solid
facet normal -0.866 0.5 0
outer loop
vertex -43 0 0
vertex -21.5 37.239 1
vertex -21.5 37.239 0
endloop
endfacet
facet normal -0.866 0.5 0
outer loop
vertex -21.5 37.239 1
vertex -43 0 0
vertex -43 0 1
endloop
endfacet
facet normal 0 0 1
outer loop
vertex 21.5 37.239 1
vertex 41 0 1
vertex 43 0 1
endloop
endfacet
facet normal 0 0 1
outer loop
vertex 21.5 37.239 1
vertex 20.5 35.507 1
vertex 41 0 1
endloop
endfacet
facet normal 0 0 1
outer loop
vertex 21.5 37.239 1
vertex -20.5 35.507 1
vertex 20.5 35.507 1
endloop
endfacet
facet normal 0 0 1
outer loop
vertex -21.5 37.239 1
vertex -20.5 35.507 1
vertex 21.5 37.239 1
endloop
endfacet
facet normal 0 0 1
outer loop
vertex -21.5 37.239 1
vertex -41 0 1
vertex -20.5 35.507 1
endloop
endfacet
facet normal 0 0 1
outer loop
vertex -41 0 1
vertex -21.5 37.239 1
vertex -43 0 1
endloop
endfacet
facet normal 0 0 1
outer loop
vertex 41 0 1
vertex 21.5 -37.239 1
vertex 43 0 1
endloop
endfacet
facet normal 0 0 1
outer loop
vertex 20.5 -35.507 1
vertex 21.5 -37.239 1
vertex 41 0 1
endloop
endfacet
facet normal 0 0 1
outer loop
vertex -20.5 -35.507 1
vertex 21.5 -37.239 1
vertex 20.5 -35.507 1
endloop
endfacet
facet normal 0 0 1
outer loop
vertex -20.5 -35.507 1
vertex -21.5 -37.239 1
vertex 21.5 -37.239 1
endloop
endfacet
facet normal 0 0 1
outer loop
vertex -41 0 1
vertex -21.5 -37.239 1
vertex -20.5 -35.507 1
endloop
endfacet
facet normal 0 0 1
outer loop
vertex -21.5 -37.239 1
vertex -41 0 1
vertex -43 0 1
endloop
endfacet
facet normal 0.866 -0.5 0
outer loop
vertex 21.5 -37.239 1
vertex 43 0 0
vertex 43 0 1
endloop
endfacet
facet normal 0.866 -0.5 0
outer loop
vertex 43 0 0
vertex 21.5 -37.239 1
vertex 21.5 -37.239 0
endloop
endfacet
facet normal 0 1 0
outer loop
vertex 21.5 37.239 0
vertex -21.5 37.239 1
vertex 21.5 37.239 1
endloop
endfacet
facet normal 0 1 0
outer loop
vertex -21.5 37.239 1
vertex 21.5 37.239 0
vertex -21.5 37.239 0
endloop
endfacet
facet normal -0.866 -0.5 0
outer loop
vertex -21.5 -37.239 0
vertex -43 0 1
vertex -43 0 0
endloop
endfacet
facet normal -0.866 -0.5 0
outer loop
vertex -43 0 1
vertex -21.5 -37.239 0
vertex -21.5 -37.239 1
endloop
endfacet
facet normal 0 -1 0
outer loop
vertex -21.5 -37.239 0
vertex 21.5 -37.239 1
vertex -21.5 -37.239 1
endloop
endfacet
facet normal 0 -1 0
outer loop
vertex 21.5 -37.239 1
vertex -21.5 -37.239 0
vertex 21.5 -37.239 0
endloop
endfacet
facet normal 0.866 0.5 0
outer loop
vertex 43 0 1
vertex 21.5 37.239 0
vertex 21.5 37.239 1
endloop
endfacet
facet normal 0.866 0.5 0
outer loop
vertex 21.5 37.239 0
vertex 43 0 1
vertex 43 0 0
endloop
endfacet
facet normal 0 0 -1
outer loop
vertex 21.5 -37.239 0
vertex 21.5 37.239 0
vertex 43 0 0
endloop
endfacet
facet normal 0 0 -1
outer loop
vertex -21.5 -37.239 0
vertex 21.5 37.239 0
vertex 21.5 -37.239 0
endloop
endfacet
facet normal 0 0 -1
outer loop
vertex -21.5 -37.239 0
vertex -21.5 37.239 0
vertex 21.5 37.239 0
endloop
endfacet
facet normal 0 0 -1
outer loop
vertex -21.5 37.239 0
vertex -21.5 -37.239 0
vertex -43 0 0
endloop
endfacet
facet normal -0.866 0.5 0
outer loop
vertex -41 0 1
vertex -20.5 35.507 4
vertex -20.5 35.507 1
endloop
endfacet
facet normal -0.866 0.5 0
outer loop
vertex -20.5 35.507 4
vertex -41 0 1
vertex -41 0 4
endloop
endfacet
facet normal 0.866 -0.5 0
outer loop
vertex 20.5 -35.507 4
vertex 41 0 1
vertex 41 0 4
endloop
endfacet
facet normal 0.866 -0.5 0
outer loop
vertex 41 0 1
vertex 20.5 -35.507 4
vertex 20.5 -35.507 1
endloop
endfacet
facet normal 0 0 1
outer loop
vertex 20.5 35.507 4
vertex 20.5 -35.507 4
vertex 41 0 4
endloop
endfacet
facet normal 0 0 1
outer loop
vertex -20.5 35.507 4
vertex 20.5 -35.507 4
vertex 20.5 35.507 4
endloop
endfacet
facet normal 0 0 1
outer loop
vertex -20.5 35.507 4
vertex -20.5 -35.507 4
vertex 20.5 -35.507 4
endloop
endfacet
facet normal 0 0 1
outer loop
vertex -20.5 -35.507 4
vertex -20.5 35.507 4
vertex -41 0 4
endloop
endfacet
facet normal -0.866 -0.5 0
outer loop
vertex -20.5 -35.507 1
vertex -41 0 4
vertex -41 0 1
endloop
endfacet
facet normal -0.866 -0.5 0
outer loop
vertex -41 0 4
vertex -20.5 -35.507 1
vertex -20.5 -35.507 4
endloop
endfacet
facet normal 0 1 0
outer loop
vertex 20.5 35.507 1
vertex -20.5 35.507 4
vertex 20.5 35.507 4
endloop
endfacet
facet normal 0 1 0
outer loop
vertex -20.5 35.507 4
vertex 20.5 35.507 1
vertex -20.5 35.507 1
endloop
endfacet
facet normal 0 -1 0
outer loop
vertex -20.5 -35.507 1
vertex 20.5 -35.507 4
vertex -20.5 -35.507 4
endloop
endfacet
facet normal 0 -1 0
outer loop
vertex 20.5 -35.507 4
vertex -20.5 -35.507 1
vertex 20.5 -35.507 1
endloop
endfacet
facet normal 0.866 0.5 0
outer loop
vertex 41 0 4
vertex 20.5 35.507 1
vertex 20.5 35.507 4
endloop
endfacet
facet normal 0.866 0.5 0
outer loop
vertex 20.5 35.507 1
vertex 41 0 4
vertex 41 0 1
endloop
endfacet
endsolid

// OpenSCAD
// file: cololight_tribute_header.scad
/* 
Cololight like hexagon lights
*/

/* 
variable definitions
*/

hex_height=25;
hex_lon_d=86;
hex_short_d=74.478;
hex_incir_rad=43;
hex_lip_depth=1;
diffuser_thickness=2;
diffuser_lip_width=0;
diffuser_edge_thickness=1;
diffuser_clip_thickness=4;
diffuser_clip_wall_thickness=1;
base_thickness=1;
edge_thickness=2;
pin_header_width=8;
pin_header_height=2.5;
clip_mouth_width=12;
clip_mouth_length=6.5;
clip_edge_offset=4.3;

clip_width=12;
clip_length=(2*clip_mouth_length)+(2*edge_thickness);
clip_height=8+base_thickness;
// main file
include <cololight_tribute_header.scad>

/*
diffuser definition
*/

group() {
    difference() {
    
        color("green")
        linear_extrude(height = diffuser_thickness, center = false, convexity = 10, twist = 0){
            circle(r=hex_incir_rad, $fn=6);
        }
    
    /* 
    diffuser cutting tool definition
    */
        
    translate([0,0,diffuser_edge_thickness]){
        group(){
          
            difference(){
                color("blue")
                linear_extrude(height = diffuser_thickness*2, center = false, convexity = 10, twist = 0){
                    circle(r=hex_incir_rad, $fn=6);
                }
                color("red")
                linear_extrude(height = diffuser_edge_thickness, center = false, convexity = 10, twist = 0){
                    circle(r=hex_incir_rad-(edge_thickness+diffuser_clip_wall_thickness), $fn=6);
                }

            }
        }
    }   
      
    
    }
}

                color("red")
                linear_extrude(height = diffuser_thickness*2, center = false, convexity = 10, twist = 0){
                    circle(r=hex_incir_rad-(edge_thickness-diffuser_lip_width), $fn=6);
                }
